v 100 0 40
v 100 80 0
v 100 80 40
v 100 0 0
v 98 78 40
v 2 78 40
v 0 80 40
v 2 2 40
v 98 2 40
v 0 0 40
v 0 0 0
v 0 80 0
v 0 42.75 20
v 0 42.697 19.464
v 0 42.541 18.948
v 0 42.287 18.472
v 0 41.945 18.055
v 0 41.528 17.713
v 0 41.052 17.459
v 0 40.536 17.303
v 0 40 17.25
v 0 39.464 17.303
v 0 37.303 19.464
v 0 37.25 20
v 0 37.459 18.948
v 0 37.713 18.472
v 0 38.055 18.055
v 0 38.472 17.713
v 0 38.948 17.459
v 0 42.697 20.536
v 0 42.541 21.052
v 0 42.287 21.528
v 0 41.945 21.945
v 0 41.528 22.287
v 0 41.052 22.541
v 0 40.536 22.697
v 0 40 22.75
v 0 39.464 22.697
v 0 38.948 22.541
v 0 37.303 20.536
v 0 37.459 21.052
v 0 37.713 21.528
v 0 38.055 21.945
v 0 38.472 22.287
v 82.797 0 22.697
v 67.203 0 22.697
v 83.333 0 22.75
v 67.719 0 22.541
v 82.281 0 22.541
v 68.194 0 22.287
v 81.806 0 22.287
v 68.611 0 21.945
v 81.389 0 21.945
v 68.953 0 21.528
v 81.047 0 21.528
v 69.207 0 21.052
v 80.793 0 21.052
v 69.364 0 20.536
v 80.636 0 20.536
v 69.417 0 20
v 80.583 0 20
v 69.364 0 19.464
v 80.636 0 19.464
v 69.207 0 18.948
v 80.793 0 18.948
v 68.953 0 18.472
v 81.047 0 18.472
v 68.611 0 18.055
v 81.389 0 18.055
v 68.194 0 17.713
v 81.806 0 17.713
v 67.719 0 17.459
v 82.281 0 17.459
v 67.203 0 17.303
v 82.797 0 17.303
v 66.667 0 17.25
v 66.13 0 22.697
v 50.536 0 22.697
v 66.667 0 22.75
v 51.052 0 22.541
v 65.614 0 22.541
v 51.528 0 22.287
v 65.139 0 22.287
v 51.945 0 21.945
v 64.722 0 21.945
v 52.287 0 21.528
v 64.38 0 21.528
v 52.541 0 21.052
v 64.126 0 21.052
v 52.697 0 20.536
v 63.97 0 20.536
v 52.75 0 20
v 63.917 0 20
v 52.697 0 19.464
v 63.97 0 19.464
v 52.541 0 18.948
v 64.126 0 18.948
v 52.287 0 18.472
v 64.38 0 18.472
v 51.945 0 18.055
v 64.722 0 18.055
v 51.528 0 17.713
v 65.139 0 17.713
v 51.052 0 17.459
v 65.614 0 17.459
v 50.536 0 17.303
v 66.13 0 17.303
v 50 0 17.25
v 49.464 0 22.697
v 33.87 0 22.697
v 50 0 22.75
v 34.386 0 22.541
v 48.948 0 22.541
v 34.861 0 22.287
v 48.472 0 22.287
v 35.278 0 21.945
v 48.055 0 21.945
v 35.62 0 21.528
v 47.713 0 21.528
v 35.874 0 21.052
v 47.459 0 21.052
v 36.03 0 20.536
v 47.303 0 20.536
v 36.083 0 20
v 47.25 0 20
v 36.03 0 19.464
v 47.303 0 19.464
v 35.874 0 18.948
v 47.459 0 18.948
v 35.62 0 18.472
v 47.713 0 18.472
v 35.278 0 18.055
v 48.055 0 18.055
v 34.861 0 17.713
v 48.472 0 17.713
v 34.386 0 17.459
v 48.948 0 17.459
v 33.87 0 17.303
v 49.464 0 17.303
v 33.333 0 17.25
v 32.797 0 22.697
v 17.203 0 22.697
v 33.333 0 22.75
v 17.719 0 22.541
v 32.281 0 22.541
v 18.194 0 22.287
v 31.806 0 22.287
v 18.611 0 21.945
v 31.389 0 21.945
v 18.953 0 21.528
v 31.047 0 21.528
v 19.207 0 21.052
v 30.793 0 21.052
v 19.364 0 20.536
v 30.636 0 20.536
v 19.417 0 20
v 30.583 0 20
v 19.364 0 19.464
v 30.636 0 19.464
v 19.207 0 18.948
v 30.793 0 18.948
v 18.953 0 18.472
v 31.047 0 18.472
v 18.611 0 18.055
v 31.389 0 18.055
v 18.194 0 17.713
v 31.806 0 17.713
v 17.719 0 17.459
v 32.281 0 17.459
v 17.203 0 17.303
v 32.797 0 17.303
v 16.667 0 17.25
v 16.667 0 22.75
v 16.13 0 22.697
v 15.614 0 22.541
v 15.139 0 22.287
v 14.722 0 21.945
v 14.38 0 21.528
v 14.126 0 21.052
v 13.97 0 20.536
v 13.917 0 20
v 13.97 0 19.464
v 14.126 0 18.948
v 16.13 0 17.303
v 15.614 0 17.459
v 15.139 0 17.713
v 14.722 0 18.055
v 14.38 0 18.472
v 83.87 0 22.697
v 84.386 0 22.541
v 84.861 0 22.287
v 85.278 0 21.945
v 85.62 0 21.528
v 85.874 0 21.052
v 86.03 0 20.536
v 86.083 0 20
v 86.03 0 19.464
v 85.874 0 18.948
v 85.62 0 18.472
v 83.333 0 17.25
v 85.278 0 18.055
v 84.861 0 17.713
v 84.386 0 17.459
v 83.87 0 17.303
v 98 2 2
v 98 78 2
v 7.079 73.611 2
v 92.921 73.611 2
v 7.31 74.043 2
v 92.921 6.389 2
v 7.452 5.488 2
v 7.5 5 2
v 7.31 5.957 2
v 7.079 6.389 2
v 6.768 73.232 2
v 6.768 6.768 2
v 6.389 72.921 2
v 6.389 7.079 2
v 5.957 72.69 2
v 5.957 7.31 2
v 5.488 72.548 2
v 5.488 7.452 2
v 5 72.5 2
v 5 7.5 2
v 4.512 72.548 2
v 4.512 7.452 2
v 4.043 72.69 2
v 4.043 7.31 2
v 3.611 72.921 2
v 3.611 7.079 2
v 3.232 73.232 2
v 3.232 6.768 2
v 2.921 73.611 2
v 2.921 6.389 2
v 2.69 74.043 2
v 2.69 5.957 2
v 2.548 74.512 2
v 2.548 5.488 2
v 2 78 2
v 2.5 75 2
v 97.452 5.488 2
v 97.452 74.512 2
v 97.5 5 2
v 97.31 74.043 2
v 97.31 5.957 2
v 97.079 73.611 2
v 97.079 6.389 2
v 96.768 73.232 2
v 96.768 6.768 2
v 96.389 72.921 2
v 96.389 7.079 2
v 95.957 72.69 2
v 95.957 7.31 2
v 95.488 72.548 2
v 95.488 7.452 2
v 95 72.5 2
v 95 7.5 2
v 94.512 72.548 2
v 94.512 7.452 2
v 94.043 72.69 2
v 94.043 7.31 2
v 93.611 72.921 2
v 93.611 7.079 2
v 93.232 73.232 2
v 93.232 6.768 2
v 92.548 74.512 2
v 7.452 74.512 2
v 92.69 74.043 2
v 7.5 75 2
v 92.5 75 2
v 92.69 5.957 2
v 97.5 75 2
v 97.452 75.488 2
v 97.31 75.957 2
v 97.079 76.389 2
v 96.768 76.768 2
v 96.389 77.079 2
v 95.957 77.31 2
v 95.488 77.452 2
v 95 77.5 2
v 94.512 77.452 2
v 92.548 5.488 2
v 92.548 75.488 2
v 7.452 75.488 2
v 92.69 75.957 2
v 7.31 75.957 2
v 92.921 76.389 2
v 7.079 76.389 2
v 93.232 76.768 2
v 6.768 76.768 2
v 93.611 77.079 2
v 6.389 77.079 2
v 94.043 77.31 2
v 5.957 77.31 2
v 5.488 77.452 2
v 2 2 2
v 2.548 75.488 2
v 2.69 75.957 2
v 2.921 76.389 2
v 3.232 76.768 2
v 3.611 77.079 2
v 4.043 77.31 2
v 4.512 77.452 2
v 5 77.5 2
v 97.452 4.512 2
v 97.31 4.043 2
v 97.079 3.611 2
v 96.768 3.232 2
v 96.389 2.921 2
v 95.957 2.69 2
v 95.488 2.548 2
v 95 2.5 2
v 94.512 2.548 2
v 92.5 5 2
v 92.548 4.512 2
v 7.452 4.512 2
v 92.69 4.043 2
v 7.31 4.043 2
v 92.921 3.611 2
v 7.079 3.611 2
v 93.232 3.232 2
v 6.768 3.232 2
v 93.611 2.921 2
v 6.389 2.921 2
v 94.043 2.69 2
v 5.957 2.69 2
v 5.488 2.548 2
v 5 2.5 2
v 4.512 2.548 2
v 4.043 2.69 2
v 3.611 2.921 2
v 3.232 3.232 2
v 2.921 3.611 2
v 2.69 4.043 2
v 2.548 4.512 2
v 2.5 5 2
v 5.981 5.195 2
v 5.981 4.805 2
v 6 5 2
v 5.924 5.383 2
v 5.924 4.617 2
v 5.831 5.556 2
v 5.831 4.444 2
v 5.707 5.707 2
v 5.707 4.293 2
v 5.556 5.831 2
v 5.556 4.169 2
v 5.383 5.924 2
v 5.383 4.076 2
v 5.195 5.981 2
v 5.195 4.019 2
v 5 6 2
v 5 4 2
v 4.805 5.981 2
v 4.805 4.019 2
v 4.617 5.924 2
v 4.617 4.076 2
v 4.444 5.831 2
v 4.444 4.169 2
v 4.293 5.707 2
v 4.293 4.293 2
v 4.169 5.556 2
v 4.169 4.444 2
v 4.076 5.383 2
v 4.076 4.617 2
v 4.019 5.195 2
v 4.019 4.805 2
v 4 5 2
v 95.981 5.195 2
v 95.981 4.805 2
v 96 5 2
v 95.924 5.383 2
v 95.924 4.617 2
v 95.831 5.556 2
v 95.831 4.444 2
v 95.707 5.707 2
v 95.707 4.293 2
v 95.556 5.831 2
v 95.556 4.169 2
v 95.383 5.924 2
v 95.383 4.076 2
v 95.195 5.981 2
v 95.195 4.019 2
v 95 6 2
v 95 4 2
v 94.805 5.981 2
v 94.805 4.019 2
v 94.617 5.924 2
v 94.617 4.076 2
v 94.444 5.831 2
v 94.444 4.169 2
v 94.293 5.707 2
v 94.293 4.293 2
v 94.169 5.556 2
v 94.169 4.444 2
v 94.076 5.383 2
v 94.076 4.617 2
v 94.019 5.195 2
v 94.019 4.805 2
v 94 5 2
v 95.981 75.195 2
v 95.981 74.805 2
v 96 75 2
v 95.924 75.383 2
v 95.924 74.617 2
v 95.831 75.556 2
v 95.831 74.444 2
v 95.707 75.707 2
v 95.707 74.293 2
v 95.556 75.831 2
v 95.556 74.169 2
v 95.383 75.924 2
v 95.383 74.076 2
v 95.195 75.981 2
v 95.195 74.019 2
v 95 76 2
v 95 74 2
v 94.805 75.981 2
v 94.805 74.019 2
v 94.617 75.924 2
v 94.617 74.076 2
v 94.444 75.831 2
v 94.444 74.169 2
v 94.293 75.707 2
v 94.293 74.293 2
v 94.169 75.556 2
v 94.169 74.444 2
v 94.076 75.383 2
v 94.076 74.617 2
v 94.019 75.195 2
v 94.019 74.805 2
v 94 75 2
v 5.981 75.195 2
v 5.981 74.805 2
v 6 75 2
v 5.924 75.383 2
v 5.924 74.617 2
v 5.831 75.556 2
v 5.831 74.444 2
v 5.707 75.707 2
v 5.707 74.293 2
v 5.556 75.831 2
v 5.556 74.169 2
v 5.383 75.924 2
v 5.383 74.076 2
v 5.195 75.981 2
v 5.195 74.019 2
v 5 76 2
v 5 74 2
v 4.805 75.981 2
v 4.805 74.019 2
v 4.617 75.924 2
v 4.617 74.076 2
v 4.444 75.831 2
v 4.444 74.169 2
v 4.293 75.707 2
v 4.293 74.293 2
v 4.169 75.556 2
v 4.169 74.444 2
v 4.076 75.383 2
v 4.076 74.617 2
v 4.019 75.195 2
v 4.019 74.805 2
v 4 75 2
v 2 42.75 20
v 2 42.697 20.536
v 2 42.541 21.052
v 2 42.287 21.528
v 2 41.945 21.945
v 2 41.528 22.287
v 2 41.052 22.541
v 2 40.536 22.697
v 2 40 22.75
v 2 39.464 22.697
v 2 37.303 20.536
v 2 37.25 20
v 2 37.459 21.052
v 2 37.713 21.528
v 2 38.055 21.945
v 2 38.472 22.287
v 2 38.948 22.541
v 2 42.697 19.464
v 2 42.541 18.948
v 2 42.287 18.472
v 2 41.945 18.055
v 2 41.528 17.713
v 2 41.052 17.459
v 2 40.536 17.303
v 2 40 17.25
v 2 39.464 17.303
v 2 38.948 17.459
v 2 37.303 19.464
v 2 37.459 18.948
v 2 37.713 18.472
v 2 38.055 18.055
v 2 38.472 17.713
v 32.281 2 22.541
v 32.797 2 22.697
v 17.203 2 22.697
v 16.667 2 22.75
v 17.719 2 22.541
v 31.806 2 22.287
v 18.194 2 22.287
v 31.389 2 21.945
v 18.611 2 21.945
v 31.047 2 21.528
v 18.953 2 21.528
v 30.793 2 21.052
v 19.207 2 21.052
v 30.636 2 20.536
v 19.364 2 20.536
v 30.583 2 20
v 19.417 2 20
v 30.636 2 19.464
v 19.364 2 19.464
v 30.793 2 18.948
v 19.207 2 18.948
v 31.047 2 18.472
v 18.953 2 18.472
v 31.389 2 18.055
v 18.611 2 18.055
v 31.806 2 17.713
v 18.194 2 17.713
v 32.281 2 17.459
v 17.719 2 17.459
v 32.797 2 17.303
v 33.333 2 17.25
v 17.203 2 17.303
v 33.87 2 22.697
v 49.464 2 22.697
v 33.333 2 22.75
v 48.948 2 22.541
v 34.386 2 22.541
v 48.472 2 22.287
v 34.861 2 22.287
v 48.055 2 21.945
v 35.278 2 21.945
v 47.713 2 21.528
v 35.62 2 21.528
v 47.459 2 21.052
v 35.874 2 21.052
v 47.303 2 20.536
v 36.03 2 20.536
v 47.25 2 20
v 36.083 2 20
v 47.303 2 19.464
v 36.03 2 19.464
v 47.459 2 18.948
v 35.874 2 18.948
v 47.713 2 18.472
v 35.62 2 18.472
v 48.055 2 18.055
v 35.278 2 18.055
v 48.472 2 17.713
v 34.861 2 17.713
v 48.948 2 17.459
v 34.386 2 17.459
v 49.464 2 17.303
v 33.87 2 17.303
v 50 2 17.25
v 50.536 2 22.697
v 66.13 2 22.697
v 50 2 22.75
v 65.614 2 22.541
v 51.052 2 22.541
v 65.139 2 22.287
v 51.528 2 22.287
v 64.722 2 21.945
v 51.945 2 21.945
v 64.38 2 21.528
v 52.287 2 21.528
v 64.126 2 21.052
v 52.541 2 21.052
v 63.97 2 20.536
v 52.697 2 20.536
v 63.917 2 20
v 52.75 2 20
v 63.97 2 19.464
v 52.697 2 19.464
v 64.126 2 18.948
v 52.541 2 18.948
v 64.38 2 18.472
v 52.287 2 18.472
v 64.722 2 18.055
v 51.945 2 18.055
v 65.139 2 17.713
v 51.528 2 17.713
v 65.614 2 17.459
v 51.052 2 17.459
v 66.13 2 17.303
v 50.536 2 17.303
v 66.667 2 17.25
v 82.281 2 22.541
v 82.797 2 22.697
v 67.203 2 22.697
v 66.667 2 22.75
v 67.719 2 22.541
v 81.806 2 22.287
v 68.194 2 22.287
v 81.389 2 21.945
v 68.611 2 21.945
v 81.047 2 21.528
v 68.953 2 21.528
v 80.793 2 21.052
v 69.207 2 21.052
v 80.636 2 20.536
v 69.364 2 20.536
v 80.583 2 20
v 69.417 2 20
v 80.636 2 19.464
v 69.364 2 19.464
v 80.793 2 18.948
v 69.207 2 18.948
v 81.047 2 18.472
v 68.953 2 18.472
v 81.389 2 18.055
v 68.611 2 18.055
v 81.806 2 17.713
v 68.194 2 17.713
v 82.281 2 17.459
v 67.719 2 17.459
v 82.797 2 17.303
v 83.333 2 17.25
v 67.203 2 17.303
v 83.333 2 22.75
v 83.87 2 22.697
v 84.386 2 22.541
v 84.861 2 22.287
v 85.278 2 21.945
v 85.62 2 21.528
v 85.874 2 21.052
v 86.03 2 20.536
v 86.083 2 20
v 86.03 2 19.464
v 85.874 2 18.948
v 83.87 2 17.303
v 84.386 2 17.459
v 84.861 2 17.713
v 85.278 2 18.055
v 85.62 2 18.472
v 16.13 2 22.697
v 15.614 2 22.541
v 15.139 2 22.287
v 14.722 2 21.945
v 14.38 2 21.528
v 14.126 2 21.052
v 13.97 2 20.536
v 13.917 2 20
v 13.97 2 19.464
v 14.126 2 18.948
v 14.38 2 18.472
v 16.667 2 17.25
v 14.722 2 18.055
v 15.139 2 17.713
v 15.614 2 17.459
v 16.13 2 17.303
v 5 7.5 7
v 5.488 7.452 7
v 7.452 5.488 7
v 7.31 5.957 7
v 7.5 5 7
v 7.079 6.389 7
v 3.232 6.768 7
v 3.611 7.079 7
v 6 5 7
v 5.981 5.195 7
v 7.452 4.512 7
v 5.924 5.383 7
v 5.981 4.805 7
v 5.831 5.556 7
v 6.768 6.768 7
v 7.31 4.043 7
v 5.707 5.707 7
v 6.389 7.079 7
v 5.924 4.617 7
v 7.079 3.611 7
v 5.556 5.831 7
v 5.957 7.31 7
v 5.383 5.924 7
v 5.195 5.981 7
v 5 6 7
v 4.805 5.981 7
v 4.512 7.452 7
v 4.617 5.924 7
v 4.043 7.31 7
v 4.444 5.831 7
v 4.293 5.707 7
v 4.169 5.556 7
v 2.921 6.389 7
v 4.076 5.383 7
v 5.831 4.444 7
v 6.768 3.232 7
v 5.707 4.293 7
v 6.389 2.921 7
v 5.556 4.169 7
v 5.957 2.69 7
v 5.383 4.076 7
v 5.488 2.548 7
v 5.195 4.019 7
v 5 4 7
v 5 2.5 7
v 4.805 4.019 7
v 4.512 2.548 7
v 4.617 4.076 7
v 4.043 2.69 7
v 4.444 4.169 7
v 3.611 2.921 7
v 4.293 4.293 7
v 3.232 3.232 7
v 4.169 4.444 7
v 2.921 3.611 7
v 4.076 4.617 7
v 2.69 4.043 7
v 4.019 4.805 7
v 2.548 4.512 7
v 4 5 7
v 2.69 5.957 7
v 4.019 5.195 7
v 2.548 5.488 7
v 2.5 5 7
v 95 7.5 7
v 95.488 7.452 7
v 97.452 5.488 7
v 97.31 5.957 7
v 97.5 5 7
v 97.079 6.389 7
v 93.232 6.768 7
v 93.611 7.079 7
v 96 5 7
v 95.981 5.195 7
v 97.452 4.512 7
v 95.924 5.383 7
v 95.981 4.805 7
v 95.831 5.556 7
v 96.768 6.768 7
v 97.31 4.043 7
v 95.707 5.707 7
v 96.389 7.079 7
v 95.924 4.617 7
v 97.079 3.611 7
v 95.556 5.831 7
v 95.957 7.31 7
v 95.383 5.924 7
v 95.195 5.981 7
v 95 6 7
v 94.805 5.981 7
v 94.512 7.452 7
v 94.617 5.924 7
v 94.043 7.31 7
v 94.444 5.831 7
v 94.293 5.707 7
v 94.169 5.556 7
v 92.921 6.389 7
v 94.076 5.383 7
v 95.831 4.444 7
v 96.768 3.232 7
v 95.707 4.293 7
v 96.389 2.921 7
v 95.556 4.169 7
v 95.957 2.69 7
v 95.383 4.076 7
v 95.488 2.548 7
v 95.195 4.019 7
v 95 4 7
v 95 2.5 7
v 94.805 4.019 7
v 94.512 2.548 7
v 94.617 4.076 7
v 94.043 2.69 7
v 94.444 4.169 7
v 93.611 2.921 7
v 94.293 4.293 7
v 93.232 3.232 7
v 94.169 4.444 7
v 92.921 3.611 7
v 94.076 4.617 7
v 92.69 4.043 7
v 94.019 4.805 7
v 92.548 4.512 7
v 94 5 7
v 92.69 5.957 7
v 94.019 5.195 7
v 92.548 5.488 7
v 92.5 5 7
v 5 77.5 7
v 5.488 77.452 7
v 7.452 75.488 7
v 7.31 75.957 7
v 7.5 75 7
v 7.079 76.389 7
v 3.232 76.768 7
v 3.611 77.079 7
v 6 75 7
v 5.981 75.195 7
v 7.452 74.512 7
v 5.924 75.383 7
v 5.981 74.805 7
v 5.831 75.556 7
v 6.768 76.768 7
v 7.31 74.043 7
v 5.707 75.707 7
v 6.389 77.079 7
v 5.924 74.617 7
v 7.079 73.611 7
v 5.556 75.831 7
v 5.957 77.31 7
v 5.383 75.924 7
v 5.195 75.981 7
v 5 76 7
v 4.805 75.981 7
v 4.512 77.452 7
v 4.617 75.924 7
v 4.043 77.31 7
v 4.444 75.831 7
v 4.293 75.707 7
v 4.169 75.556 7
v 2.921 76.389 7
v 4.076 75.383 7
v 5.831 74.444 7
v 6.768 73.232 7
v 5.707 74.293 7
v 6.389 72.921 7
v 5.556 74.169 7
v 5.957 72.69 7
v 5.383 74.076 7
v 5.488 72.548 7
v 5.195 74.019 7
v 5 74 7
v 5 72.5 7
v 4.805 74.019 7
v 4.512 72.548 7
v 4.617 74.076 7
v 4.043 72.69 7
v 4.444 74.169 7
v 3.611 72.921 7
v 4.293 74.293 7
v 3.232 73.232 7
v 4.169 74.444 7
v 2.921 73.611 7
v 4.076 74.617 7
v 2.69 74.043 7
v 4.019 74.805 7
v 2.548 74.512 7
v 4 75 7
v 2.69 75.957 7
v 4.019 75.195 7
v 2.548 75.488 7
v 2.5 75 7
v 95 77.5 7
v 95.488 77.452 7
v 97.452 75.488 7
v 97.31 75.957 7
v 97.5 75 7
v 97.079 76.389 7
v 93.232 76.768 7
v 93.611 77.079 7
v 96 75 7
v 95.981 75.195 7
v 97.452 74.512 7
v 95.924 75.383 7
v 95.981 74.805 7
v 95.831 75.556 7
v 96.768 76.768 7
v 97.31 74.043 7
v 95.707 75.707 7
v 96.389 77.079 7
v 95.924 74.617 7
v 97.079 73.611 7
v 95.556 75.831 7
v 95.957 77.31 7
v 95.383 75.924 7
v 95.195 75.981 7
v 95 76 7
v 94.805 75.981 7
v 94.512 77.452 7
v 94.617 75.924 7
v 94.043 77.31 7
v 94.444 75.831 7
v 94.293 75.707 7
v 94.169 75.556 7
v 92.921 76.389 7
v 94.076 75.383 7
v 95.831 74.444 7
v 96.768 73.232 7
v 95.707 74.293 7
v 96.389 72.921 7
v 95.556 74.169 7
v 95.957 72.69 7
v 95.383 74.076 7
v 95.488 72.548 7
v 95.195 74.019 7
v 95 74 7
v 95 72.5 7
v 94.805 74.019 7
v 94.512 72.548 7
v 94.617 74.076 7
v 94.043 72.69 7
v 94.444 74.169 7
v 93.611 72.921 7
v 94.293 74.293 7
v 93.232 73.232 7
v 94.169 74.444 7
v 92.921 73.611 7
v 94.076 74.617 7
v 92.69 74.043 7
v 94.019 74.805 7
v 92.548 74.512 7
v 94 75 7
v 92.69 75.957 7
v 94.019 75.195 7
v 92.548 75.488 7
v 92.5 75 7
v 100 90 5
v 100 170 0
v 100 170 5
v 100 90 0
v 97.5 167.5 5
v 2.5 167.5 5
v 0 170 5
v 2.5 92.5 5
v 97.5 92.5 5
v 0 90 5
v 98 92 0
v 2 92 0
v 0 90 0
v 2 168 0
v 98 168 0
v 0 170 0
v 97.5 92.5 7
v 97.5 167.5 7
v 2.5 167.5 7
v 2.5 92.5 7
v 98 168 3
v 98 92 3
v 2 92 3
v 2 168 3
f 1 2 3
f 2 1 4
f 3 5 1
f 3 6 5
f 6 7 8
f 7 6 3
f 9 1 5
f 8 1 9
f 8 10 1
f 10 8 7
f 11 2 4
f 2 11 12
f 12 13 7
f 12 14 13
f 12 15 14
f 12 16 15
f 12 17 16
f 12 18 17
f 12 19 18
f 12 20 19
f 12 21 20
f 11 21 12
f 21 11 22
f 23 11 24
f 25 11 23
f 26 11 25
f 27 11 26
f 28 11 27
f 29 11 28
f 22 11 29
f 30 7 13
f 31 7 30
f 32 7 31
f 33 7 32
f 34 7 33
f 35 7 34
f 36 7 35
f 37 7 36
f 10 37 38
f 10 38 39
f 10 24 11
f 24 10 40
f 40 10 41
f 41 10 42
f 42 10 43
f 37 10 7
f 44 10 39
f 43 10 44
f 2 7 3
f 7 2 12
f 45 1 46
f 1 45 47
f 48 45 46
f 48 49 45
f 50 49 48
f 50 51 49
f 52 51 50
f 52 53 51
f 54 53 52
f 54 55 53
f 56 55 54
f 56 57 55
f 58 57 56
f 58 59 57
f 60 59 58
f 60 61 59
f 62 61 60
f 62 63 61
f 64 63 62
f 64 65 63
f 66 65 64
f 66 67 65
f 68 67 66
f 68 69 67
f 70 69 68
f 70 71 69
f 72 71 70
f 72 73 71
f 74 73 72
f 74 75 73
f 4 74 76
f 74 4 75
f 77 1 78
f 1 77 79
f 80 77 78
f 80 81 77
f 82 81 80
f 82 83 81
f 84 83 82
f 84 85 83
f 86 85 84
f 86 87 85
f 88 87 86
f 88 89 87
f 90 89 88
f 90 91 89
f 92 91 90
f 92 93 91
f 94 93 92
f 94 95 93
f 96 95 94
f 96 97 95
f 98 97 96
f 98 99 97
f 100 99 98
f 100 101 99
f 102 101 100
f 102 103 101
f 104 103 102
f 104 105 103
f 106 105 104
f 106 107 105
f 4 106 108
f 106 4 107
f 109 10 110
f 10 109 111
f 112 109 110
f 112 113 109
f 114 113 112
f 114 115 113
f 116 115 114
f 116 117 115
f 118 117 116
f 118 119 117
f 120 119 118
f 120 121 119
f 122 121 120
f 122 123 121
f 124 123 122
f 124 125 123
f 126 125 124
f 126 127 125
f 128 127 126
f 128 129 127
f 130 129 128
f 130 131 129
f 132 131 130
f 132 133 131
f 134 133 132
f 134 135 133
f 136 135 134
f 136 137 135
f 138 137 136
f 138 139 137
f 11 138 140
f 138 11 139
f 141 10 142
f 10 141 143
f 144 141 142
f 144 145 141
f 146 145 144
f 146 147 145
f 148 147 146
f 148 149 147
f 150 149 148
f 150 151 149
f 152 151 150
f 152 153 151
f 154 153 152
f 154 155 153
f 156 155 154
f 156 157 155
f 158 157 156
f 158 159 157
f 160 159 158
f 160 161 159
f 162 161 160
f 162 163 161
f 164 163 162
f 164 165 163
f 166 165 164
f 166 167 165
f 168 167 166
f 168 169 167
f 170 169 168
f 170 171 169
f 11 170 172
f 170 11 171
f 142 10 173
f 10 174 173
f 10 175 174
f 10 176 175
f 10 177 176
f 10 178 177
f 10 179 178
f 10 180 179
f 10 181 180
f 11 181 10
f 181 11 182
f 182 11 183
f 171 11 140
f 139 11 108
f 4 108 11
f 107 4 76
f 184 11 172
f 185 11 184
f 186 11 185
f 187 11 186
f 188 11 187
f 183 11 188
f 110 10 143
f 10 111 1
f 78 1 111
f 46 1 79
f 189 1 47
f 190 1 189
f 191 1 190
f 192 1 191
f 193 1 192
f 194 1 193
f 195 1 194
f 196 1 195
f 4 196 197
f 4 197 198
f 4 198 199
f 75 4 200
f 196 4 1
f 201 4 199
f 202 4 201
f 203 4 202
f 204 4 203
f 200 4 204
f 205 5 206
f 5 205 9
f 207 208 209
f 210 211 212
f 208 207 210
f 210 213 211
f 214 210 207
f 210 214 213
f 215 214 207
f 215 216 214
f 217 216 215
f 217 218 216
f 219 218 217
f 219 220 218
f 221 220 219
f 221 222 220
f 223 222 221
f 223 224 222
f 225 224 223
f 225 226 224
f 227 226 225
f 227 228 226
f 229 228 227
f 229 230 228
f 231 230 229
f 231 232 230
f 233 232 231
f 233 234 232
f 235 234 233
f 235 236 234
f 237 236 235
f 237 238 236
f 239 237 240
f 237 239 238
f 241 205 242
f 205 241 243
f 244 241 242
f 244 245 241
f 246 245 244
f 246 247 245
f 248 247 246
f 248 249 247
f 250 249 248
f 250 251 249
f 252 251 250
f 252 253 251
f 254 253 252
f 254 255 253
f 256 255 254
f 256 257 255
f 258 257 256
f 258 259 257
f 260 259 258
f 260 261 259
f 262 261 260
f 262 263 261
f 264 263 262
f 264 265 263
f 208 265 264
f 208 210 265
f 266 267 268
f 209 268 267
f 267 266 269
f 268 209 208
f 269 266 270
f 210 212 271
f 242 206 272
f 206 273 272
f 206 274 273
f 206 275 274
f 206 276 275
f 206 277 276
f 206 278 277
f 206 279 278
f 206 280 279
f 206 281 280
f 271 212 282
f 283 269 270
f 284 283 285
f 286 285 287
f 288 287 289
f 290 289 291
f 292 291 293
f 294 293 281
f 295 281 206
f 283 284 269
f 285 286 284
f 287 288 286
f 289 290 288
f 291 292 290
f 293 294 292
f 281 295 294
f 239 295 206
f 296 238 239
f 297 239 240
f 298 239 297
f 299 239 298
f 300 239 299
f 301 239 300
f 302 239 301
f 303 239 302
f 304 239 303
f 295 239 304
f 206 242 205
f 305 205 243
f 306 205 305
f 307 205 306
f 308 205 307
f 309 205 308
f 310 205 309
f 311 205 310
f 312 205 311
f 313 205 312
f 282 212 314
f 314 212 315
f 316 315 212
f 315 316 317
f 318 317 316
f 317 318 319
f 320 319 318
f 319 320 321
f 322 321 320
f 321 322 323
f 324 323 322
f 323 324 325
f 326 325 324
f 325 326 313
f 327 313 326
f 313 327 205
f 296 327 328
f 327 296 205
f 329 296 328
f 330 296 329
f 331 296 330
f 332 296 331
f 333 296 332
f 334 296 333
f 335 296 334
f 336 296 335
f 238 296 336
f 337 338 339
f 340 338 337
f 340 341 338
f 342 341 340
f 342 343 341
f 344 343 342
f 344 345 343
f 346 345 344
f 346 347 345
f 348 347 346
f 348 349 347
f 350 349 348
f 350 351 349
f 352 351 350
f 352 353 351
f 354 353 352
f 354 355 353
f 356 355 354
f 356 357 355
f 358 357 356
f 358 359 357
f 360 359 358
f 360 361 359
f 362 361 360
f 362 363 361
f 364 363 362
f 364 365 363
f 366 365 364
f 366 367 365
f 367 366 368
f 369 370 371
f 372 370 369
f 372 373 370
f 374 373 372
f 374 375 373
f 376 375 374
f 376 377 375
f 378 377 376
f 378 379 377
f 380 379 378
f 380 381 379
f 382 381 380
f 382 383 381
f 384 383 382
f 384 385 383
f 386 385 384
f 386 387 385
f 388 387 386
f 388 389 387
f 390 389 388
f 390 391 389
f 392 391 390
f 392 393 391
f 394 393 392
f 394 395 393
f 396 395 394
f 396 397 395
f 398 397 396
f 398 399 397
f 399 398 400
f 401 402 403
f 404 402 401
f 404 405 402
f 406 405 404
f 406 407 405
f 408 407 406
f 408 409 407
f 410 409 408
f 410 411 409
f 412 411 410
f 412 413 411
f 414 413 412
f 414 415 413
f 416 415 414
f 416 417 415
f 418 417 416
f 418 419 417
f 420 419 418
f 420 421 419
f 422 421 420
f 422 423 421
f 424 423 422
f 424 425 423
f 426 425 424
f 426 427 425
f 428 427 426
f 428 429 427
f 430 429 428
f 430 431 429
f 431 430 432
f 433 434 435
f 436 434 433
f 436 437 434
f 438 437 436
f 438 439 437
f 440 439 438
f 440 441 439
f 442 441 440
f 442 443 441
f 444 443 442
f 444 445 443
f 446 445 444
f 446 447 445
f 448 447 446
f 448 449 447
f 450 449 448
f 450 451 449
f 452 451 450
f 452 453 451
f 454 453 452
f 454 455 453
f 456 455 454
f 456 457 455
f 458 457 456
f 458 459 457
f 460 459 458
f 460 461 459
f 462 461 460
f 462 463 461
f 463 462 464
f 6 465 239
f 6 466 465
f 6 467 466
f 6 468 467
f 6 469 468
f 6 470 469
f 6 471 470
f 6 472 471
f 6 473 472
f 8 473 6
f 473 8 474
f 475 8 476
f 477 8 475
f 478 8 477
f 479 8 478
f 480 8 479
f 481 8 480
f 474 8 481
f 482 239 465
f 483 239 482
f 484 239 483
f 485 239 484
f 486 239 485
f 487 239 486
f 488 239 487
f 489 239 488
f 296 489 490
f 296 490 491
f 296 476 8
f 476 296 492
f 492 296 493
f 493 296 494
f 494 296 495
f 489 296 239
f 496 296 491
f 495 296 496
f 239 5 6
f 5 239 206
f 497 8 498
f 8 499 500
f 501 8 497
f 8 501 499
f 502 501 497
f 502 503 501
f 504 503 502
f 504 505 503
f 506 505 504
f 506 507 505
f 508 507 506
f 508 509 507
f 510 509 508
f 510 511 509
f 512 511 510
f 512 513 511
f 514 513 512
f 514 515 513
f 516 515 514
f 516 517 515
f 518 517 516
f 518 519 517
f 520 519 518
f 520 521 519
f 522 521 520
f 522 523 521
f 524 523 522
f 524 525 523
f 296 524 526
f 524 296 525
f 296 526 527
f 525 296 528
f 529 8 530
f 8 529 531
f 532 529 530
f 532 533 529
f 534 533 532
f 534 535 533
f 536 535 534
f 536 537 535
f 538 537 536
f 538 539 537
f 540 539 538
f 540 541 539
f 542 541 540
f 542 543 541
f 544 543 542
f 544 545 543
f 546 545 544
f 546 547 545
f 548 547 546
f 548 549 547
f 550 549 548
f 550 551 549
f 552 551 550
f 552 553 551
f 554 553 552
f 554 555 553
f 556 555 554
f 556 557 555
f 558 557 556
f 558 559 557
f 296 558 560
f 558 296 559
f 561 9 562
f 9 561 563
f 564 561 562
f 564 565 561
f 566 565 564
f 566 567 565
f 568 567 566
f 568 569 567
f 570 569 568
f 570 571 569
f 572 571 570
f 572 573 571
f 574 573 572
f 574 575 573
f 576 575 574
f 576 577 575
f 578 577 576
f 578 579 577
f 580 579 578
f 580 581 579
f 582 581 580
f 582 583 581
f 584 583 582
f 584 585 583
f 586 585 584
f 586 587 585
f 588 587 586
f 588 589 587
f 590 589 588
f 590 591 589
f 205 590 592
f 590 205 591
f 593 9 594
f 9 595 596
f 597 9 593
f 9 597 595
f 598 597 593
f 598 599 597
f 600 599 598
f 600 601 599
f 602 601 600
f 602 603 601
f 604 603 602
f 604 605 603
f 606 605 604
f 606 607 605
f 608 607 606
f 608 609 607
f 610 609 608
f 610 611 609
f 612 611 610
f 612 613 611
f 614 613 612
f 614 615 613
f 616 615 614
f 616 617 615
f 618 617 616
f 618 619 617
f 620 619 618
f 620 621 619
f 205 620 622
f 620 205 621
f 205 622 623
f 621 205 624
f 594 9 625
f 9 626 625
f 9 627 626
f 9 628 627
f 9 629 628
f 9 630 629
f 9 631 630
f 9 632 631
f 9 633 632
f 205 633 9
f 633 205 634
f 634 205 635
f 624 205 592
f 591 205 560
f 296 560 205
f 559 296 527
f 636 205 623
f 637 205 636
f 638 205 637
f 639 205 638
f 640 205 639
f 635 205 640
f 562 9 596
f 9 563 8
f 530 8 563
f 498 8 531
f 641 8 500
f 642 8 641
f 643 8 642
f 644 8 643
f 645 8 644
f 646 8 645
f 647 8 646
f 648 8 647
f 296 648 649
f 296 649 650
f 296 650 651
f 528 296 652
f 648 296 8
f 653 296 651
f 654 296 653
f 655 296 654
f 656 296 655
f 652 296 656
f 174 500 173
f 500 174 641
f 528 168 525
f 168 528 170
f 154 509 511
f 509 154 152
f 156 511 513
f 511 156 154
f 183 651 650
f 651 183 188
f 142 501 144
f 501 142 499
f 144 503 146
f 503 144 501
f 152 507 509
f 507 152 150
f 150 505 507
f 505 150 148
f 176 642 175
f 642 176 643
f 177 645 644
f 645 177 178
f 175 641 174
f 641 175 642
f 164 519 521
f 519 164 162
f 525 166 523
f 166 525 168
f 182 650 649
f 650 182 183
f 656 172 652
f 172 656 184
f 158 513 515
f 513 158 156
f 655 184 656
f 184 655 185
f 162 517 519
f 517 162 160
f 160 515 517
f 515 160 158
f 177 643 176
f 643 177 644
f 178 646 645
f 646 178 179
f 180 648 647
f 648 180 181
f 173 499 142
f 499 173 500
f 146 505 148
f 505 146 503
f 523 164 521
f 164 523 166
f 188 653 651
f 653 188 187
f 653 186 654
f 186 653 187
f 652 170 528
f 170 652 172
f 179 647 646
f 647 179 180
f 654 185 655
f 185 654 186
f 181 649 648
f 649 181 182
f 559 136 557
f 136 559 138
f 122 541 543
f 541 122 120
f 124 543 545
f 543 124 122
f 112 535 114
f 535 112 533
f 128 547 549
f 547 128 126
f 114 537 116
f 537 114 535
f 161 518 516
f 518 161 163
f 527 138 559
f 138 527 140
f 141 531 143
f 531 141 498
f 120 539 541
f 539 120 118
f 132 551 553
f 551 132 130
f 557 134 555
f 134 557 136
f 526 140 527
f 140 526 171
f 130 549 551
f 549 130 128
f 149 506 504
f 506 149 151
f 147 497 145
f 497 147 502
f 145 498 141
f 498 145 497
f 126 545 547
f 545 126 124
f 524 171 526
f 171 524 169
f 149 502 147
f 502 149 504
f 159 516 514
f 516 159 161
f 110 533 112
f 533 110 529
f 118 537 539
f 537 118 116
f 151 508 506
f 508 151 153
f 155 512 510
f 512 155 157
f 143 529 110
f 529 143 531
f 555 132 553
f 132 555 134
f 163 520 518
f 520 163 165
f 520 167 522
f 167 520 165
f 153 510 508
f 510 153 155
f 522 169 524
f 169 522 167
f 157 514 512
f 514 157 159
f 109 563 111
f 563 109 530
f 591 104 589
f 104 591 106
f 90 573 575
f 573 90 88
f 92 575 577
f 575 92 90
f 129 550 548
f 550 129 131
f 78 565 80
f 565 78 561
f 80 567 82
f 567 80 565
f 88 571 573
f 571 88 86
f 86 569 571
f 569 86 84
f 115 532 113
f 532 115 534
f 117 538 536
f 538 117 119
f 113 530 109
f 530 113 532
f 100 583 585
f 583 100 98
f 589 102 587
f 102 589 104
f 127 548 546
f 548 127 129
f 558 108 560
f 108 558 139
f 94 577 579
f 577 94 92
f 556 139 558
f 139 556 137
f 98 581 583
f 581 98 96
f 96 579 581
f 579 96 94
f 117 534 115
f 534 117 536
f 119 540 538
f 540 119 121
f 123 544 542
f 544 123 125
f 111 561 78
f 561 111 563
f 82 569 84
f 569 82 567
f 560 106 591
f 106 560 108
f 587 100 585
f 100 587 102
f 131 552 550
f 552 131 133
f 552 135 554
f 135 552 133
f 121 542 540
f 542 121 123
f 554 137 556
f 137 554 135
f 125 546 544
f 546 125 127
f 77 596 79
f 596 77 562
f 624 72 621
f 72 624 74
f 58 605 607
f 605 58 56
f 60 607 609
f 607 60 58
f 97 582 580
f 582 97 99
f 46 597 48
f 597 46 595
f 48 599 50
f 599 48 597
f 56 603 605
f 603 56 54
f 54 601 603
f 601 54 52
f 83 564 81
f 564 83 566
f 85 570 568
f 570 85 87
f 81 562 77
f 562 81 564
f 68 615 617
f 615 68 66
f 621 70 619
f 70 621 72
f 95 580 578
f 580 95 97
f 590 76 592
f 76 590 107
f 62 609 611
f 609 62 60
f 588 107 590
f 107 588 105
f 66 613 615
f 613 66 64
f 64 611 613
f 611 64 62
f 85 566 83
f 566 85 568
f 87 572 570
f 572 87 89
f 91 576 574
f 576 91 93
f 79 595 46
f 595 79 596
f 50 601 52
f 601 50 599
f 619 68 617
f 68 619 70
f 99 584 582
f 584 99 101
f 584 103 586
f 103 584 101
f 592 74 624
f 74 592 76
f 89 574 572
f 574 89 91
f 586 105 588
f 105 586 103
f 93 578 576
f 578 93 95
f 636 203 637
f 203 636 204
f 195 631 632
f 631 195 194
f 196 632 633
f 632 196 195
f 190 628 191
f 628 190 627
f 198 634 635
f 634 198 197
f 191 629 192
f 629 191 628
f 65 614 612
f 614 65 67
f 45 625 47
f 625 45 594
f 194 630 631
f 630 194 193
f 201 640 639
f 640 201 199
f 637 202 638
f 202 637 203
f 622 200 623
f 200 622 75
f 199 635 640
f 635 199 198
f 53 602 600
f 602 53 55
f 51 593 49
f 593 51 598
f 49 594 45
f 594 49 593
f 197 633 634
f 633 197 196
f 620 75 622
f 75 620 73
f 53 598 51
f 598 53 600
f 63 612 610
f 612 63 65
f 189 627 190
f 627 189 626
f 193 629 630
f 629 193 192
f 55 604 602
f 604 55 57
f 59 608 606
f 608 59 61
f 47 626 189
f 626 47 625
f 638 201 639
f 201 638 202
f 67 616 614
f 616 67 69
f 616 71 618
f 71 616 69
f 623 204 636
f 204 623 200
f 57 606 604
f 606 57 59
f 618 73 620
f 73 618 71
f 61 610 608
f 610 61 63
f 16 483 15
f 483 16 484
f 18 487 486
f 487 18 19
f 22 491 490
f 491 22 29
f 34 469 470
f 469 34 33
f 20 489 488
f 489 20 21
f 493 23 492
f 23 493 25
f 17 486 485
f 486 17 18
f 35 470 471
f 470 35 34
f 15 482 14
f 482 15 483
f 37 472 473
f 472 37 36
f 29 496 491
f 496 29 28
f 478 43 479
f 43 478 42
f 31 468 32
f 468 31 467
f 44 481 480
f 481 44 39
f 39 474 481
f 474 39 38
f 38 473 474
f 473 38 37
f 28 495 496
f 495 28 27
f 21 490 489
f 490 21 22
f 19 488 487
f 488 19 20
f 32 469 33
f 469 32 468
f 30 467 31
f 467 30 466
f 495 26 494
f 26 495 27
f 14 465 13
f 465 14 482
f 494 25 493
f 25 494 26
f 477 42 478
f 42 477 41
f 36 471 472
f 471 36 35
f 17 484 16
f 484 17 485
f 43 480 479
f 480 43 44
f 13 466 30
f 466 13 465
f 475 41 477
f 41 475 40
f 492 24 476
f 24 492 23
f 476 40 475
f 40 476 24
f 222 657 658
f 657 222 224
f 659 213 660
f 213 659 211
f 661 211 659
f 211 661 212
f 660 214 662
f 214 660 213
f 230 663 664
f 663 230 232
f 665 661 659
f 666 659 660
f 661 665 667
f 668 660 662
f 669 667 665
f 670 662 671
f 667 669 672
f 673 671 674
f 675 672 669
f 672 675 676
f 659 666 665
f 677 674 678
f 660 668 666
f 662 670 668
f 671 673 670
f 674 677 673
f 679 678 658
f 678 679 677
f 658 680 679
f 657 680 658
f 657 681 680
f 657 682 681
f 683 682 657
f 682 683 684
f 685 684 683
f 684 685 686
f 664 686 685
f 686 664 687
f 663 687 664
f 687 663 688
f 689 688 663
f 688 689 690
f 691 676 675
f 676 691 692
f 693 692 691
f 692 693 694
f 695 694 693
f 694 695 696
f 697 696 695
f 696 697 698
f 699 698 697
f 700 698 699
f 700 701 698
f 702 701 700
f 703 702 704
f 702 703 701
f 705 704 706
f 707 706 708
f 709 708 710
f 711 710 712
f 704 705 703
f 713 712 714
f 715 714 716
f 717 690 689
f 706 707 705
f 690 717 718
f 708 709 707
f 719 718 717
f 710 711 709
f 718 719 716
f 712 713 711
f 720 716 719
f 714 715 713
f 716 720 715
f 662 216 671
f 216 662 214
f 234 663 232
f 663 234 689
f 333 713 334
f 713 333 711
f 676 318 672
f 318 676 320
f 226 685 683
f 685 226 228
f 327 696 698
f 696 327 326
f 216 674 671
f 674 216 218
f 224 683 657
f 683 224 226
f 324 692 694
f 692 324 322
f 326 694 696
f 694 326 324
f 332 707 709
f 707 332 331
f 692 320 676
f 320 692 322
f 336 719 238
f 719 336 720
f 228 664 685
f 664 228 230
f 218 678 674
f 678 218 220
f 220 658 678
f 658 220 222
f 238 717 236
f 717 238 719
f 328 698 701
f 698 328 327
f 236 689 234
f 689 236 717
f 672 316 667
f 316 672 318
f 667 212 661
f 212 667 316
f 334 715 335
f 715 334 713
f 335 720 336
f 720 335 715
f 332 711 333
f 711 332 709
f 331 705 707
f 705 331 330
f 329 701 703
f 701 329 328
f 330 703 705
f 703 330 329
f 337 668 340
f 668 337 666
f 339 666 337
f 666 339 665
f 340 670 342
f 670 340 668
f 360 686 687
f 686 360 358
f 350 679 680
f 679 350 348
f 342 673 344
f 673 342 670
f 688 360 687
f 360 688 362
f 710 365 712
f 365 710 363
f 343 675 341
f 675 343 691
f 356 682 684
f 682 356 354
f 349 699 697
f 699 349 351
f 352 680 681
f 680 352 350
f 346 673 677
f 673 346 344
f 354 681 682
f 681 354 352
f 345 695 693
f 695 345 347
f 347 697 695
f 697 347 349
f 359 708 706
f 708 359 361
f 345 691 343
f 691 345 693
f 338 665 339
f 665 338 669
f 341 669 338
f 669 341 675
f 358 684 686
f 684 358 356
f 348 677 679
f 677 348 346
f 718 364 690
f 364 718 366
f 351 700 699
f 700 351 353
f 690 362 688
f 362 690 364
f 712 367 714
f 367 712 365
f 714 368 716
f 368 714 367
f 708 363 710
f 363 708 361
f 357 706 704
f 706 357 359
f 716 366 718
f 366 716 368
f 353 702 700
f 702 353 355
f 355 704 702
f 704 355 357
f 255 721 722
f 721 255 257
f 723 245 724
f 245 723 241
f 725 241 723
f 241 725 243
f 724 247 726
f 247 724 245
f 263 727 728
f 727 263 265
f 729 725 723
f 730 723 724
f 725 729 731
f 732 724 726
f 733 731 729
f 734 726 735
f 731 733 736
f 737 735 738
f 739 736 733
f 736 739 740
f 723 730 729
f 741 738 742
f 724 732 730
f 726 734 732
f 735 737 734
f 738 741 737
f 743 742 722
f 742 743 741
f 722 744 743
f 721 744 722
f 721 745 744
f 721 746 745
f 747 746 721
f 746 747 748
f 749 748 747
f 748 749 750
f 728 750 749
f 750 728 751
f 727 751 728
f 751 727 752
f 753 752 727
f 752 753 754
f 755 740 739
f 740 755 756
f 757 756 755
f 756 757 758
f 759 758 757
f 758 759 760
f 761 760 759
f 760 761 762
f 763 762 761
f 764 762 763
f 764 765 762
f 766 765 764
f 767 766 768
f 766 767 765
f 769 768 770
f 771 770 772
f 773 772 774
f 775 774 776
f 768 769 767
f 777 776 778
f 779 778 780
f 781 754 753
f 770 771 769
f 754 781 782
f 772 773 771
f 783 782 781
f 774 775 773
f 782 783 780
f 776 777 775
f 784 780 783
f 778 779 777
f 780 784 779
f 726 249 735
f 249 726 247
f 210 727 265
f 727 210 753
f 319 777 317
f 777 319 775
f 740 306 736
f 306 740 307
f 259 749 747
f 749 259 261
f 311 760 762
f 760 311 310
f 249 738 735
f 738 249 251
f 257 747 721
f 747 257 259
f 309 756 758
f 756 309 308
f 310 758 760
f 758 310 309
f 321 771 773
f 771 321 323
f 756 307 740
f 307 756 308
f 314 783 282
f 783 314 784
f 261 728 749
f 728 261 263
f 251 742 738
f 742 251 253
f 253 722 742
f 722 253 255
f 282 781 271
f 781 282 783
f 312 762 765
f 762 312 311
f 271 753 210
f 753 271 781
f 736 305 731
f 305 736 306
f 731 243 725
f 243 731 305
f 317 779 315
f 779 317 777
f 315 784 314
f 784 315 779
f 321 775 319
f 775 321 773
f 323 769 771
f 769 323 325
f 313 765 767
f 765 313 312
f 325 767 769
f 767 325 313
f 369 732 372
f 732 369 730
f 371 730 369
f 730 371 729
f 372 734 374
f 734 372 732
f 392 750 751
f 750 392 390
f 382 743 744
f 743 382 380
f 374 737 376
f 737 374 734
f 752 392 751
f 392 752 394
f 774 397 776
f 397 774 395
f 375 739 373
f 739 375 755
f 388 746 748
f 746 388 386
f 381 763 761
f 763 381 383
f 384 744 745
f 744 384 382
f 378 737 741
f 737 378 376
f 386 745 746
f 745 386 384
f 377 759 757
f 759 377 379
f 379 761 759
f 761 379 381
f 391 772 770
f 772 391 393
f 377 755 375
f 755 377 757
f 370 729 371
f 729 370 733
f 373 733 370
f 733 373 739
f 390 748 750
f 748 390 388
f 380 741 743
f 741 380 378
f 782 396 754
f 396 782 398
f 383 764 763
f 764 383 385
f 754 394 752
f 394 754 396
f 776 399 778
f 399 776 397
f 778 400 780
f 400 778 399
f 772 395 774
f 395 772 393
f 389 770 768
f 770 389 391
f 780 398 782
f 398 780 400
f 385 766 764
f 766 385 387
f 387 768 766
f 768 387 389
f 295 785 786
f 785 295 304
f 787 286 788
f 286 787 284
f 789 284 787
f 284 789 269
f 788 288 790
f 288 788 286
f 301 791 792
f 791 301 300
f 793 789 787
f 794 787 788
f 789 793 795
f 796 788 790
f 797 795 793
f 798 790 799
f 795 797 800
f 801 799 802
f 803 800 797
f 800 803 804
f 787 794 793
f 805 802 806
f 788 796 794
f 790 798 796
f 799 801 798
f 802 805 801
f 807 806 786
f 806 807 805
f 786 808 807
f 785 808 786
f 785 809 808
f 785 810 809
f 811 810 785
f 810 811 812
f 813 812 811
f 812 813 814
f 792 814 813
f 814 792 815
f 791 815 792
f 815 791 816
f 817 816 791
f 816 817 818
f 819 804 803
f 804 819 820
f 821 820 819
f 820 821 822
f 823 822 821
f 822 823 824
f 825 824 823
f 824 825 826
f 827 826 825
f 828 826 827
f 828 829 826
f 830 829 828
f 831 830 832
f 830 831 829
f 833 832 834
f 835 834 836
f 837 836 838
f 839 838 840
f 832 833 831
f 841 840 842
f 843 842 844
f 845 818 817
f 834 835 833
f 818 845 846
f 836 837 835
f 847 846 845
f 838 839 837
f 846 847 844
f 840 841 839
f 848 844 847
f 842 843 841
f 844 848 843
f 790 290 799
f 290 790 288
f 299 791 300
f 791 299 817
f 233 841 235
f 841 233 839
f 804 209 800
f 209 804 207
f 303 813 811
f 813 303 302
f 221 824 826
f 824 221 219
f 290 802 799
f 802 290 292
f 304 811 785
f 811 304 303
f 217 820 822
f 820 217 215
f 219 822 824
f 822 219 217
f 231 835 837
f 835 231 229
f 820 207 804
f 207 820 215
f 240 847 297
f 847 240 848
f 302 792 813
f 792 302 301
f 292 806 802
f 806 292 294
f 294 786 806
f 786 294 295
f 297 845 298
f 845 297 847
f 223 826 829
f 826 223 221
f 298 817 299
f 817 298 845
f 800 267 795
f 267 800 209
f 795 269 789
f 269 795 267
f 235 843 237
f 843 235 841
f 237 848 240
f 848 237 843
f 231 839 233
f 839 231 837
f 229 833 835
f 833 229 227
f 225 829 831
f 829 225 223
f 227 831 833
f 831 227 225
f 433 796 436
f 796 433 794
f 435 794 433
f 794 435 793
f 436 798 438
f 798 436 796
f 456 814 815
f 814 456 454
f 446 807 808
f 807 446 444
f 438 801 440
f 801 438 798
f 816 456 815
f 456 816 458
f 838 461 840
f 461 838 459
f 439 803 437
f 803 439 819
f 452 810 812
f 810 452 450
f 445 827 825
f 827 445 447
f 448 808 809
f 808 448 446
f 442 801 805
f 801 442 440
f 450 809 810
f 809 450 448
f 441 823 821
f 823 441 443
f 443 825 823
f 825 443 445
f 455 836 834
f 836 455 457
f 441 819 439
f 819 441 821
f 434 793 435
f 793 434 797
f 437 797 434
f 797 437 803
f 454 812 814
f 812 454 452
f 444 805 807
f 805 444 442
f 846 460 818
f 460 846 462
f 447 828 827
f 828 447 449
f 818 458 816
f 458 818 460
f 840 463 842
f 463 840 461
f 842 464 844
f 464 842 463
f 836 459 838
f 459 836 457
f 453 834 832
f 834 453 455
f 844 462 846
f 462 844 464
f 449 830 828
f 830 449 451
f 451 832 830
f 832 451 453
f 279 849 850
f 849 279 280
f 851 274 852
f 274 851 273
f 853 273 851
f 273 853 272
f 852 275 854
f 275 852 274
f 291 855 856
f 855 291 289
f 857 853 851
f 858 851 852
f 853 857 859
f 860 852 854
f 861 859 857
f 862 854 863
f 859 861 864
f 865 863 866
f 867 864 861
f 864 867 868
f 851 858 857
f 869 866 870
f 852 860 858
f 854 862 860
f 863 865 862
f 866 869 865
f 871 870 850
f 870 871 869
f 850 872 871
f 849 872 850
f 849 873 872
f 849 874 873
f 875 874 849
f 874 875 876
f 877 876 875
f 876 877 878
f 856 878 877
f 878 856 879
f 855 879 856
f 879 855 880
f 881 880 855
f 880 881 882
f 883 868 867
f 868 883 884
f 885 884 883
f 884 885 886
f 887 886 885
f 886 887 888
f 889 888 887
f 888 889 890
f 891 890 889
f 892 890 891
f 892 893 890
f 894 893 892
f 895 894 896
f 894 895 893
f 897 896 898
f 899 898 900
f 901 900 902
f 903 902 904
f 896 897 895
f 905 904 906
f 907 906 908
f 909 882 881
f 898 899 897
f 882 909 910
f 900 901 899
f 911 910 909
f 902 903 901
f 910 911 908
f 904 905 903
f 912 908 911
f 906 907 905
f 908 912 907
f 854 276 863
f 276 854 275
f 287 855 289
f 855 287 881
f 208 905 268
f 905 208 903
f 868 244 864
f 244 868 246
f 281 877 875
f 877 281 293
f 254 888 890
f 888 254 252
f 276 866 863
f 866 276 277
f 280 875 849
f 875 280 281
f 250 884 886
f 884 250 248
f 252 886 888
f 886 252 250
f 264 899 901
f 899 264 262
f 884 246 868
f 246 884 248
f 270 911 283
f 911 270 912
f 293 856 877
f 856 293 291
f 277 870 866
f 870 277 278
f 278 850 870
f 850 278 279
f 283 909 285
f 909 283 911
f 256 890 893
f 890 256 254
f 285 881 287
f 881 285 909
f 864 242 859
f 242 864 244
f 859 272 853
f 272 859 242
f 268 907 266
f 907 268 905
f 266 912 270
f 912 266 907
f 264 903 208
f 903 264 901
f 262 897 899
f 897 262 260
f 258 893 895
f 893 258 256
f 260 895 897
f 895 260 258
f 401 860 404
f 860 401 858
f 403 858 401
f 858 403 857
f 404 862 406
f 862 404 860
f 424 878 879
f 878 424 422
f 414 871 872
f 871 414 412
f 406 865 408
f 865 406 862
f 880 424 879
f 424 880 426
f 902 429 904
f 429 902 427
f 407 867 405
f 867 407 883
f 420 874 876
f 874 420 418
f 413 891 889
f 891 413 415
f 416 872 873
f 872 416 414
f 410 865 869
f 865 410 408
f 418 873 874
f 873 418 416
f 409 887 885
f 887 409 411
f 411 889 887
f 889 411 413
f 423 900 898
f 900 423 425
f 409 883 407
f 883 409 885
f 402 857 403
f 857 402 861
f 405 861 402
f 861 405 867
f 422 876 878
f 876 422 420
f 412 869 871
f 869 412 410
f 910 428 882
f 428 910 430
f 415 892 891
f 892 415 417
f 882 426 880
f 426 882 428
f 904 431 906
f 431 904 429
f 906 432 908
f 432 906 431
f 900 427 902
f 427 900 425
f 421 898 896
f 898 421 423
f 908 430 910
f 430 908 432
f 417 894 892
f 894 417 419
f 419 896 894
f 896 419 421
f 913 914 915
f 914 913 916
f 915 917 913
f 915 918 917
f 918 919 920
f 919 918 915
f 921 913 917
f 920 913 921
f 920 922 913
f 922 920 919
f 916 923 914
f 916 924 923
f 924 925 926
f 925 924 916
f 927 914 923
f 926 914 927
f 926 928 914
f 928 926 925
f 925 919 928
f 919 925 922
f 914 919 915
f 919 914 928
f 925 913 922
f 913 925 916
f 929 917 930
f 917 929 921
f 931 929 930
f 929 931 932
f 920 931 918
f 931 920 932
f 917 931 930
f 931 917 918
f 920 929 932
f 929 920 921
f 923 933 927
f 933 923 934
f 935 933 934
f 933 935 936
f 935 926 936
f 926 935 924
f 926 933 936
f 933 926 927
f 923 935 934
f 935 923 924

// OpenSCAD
// Parametric Box for Circuit Project with Clickable Lid

// Box dimensions
box_length = 100; // Adjust as needed
box_width = 80;   // Adjust as needed
box_height = 40;  // Adjust as needed
wall_thickness = 2;

// Lid specifications
lid_height = 5;
lid_tolerance = 0.5; // Adjust for tighter/looser fit

// Barrel jack specifications
barrel_jack_diameter = 5.5;
barrel_jack_depth = wall_thickness + 25; // Ensure it's longer than the wall thickness

// Mounting post specifications
post_height = 5;
post_diameter = 5;
screw_hole_diameter = 2;

// Create the main box
module main_box() {
    difference() {
        cube([box_length, box_width, box_height]);
        translate([wall_thickness, wall_thickness, wall_thickness])
            cube([box_length - 2*wall_thickness, 
                  box_width - 2*wall_thickness, 
                  box_height]);
    }
}

// Create the lid
module lid() {
    difference() {
        union() {
            // Main lid body
            cube([box_length, box_width, lid_height]);
            
            // Inner lip for clicking in
            translate([wall_thickness + lid_tolerance, wall_thickness + lid_tolerance, lid_height])
                cube([box_length - 2*(wall_thickness + lid_tolerance), 
                      box_width - 2*(wall_thickness + lid_tolerance), 
                      wall_thickness]);
        }
        // Hollow out the lid
        translate([wall_thickness, wall_thickness, -1])
            cube([box_length - 2*wall_thickness, 
                  box_width - 2*wall_thickness, 
                  lid_height - wall_thickness + 1]);
    }
}

// Create a barrel jack hole
module barrel_jack_hole() {
    cylinder(h = barrel_jack_depth, d = barrel_jack_diameter, $fn=32, center=true);
}

// Create a mounting post
module mounting_post() {
    difference() {
        cylinder(h = post_height, d = post_diameter, $fn=32);
        translate([0, 0, -1])
            cylinder(h = post_height + 2, d = screw_hole_diameter, $fn=32);
    }
}

// Main assembly
module assembly() {
    difference() {
        main_box();
        
        // West side barrel jack (centered vertically)
        translate([-1, box_width/2, box_height/2])
            rotate([0, 90, 0])
                barrel_jack_hole();
        
        // North side barrel jacks
        for (i = [1:5]) {
            translate([box_length * i/6, -1, box_height/2])
                rotate([90, 0, 0])
                    barrel_jack_hole();
        }
    }
    
    // Add mounting posts
    post_offset = 5;
    translate([post_offset, post_offset, wall_thickness]) mounting_post();
    translate([box_length - post_offset, post_offset, wall_thickness]) mounting_post();
    translate([post_offset, box_width - post_offset, wall_thickness]) mounting_post();
    translate([box_length - post_offset, box_width - post_offset, wall_thickness]) mounting_post();
}

// Render the assembly
assembly();

// Render the lid (uncomment to view/export separately)
translate([0, box_width + 10, 0]) lid();
